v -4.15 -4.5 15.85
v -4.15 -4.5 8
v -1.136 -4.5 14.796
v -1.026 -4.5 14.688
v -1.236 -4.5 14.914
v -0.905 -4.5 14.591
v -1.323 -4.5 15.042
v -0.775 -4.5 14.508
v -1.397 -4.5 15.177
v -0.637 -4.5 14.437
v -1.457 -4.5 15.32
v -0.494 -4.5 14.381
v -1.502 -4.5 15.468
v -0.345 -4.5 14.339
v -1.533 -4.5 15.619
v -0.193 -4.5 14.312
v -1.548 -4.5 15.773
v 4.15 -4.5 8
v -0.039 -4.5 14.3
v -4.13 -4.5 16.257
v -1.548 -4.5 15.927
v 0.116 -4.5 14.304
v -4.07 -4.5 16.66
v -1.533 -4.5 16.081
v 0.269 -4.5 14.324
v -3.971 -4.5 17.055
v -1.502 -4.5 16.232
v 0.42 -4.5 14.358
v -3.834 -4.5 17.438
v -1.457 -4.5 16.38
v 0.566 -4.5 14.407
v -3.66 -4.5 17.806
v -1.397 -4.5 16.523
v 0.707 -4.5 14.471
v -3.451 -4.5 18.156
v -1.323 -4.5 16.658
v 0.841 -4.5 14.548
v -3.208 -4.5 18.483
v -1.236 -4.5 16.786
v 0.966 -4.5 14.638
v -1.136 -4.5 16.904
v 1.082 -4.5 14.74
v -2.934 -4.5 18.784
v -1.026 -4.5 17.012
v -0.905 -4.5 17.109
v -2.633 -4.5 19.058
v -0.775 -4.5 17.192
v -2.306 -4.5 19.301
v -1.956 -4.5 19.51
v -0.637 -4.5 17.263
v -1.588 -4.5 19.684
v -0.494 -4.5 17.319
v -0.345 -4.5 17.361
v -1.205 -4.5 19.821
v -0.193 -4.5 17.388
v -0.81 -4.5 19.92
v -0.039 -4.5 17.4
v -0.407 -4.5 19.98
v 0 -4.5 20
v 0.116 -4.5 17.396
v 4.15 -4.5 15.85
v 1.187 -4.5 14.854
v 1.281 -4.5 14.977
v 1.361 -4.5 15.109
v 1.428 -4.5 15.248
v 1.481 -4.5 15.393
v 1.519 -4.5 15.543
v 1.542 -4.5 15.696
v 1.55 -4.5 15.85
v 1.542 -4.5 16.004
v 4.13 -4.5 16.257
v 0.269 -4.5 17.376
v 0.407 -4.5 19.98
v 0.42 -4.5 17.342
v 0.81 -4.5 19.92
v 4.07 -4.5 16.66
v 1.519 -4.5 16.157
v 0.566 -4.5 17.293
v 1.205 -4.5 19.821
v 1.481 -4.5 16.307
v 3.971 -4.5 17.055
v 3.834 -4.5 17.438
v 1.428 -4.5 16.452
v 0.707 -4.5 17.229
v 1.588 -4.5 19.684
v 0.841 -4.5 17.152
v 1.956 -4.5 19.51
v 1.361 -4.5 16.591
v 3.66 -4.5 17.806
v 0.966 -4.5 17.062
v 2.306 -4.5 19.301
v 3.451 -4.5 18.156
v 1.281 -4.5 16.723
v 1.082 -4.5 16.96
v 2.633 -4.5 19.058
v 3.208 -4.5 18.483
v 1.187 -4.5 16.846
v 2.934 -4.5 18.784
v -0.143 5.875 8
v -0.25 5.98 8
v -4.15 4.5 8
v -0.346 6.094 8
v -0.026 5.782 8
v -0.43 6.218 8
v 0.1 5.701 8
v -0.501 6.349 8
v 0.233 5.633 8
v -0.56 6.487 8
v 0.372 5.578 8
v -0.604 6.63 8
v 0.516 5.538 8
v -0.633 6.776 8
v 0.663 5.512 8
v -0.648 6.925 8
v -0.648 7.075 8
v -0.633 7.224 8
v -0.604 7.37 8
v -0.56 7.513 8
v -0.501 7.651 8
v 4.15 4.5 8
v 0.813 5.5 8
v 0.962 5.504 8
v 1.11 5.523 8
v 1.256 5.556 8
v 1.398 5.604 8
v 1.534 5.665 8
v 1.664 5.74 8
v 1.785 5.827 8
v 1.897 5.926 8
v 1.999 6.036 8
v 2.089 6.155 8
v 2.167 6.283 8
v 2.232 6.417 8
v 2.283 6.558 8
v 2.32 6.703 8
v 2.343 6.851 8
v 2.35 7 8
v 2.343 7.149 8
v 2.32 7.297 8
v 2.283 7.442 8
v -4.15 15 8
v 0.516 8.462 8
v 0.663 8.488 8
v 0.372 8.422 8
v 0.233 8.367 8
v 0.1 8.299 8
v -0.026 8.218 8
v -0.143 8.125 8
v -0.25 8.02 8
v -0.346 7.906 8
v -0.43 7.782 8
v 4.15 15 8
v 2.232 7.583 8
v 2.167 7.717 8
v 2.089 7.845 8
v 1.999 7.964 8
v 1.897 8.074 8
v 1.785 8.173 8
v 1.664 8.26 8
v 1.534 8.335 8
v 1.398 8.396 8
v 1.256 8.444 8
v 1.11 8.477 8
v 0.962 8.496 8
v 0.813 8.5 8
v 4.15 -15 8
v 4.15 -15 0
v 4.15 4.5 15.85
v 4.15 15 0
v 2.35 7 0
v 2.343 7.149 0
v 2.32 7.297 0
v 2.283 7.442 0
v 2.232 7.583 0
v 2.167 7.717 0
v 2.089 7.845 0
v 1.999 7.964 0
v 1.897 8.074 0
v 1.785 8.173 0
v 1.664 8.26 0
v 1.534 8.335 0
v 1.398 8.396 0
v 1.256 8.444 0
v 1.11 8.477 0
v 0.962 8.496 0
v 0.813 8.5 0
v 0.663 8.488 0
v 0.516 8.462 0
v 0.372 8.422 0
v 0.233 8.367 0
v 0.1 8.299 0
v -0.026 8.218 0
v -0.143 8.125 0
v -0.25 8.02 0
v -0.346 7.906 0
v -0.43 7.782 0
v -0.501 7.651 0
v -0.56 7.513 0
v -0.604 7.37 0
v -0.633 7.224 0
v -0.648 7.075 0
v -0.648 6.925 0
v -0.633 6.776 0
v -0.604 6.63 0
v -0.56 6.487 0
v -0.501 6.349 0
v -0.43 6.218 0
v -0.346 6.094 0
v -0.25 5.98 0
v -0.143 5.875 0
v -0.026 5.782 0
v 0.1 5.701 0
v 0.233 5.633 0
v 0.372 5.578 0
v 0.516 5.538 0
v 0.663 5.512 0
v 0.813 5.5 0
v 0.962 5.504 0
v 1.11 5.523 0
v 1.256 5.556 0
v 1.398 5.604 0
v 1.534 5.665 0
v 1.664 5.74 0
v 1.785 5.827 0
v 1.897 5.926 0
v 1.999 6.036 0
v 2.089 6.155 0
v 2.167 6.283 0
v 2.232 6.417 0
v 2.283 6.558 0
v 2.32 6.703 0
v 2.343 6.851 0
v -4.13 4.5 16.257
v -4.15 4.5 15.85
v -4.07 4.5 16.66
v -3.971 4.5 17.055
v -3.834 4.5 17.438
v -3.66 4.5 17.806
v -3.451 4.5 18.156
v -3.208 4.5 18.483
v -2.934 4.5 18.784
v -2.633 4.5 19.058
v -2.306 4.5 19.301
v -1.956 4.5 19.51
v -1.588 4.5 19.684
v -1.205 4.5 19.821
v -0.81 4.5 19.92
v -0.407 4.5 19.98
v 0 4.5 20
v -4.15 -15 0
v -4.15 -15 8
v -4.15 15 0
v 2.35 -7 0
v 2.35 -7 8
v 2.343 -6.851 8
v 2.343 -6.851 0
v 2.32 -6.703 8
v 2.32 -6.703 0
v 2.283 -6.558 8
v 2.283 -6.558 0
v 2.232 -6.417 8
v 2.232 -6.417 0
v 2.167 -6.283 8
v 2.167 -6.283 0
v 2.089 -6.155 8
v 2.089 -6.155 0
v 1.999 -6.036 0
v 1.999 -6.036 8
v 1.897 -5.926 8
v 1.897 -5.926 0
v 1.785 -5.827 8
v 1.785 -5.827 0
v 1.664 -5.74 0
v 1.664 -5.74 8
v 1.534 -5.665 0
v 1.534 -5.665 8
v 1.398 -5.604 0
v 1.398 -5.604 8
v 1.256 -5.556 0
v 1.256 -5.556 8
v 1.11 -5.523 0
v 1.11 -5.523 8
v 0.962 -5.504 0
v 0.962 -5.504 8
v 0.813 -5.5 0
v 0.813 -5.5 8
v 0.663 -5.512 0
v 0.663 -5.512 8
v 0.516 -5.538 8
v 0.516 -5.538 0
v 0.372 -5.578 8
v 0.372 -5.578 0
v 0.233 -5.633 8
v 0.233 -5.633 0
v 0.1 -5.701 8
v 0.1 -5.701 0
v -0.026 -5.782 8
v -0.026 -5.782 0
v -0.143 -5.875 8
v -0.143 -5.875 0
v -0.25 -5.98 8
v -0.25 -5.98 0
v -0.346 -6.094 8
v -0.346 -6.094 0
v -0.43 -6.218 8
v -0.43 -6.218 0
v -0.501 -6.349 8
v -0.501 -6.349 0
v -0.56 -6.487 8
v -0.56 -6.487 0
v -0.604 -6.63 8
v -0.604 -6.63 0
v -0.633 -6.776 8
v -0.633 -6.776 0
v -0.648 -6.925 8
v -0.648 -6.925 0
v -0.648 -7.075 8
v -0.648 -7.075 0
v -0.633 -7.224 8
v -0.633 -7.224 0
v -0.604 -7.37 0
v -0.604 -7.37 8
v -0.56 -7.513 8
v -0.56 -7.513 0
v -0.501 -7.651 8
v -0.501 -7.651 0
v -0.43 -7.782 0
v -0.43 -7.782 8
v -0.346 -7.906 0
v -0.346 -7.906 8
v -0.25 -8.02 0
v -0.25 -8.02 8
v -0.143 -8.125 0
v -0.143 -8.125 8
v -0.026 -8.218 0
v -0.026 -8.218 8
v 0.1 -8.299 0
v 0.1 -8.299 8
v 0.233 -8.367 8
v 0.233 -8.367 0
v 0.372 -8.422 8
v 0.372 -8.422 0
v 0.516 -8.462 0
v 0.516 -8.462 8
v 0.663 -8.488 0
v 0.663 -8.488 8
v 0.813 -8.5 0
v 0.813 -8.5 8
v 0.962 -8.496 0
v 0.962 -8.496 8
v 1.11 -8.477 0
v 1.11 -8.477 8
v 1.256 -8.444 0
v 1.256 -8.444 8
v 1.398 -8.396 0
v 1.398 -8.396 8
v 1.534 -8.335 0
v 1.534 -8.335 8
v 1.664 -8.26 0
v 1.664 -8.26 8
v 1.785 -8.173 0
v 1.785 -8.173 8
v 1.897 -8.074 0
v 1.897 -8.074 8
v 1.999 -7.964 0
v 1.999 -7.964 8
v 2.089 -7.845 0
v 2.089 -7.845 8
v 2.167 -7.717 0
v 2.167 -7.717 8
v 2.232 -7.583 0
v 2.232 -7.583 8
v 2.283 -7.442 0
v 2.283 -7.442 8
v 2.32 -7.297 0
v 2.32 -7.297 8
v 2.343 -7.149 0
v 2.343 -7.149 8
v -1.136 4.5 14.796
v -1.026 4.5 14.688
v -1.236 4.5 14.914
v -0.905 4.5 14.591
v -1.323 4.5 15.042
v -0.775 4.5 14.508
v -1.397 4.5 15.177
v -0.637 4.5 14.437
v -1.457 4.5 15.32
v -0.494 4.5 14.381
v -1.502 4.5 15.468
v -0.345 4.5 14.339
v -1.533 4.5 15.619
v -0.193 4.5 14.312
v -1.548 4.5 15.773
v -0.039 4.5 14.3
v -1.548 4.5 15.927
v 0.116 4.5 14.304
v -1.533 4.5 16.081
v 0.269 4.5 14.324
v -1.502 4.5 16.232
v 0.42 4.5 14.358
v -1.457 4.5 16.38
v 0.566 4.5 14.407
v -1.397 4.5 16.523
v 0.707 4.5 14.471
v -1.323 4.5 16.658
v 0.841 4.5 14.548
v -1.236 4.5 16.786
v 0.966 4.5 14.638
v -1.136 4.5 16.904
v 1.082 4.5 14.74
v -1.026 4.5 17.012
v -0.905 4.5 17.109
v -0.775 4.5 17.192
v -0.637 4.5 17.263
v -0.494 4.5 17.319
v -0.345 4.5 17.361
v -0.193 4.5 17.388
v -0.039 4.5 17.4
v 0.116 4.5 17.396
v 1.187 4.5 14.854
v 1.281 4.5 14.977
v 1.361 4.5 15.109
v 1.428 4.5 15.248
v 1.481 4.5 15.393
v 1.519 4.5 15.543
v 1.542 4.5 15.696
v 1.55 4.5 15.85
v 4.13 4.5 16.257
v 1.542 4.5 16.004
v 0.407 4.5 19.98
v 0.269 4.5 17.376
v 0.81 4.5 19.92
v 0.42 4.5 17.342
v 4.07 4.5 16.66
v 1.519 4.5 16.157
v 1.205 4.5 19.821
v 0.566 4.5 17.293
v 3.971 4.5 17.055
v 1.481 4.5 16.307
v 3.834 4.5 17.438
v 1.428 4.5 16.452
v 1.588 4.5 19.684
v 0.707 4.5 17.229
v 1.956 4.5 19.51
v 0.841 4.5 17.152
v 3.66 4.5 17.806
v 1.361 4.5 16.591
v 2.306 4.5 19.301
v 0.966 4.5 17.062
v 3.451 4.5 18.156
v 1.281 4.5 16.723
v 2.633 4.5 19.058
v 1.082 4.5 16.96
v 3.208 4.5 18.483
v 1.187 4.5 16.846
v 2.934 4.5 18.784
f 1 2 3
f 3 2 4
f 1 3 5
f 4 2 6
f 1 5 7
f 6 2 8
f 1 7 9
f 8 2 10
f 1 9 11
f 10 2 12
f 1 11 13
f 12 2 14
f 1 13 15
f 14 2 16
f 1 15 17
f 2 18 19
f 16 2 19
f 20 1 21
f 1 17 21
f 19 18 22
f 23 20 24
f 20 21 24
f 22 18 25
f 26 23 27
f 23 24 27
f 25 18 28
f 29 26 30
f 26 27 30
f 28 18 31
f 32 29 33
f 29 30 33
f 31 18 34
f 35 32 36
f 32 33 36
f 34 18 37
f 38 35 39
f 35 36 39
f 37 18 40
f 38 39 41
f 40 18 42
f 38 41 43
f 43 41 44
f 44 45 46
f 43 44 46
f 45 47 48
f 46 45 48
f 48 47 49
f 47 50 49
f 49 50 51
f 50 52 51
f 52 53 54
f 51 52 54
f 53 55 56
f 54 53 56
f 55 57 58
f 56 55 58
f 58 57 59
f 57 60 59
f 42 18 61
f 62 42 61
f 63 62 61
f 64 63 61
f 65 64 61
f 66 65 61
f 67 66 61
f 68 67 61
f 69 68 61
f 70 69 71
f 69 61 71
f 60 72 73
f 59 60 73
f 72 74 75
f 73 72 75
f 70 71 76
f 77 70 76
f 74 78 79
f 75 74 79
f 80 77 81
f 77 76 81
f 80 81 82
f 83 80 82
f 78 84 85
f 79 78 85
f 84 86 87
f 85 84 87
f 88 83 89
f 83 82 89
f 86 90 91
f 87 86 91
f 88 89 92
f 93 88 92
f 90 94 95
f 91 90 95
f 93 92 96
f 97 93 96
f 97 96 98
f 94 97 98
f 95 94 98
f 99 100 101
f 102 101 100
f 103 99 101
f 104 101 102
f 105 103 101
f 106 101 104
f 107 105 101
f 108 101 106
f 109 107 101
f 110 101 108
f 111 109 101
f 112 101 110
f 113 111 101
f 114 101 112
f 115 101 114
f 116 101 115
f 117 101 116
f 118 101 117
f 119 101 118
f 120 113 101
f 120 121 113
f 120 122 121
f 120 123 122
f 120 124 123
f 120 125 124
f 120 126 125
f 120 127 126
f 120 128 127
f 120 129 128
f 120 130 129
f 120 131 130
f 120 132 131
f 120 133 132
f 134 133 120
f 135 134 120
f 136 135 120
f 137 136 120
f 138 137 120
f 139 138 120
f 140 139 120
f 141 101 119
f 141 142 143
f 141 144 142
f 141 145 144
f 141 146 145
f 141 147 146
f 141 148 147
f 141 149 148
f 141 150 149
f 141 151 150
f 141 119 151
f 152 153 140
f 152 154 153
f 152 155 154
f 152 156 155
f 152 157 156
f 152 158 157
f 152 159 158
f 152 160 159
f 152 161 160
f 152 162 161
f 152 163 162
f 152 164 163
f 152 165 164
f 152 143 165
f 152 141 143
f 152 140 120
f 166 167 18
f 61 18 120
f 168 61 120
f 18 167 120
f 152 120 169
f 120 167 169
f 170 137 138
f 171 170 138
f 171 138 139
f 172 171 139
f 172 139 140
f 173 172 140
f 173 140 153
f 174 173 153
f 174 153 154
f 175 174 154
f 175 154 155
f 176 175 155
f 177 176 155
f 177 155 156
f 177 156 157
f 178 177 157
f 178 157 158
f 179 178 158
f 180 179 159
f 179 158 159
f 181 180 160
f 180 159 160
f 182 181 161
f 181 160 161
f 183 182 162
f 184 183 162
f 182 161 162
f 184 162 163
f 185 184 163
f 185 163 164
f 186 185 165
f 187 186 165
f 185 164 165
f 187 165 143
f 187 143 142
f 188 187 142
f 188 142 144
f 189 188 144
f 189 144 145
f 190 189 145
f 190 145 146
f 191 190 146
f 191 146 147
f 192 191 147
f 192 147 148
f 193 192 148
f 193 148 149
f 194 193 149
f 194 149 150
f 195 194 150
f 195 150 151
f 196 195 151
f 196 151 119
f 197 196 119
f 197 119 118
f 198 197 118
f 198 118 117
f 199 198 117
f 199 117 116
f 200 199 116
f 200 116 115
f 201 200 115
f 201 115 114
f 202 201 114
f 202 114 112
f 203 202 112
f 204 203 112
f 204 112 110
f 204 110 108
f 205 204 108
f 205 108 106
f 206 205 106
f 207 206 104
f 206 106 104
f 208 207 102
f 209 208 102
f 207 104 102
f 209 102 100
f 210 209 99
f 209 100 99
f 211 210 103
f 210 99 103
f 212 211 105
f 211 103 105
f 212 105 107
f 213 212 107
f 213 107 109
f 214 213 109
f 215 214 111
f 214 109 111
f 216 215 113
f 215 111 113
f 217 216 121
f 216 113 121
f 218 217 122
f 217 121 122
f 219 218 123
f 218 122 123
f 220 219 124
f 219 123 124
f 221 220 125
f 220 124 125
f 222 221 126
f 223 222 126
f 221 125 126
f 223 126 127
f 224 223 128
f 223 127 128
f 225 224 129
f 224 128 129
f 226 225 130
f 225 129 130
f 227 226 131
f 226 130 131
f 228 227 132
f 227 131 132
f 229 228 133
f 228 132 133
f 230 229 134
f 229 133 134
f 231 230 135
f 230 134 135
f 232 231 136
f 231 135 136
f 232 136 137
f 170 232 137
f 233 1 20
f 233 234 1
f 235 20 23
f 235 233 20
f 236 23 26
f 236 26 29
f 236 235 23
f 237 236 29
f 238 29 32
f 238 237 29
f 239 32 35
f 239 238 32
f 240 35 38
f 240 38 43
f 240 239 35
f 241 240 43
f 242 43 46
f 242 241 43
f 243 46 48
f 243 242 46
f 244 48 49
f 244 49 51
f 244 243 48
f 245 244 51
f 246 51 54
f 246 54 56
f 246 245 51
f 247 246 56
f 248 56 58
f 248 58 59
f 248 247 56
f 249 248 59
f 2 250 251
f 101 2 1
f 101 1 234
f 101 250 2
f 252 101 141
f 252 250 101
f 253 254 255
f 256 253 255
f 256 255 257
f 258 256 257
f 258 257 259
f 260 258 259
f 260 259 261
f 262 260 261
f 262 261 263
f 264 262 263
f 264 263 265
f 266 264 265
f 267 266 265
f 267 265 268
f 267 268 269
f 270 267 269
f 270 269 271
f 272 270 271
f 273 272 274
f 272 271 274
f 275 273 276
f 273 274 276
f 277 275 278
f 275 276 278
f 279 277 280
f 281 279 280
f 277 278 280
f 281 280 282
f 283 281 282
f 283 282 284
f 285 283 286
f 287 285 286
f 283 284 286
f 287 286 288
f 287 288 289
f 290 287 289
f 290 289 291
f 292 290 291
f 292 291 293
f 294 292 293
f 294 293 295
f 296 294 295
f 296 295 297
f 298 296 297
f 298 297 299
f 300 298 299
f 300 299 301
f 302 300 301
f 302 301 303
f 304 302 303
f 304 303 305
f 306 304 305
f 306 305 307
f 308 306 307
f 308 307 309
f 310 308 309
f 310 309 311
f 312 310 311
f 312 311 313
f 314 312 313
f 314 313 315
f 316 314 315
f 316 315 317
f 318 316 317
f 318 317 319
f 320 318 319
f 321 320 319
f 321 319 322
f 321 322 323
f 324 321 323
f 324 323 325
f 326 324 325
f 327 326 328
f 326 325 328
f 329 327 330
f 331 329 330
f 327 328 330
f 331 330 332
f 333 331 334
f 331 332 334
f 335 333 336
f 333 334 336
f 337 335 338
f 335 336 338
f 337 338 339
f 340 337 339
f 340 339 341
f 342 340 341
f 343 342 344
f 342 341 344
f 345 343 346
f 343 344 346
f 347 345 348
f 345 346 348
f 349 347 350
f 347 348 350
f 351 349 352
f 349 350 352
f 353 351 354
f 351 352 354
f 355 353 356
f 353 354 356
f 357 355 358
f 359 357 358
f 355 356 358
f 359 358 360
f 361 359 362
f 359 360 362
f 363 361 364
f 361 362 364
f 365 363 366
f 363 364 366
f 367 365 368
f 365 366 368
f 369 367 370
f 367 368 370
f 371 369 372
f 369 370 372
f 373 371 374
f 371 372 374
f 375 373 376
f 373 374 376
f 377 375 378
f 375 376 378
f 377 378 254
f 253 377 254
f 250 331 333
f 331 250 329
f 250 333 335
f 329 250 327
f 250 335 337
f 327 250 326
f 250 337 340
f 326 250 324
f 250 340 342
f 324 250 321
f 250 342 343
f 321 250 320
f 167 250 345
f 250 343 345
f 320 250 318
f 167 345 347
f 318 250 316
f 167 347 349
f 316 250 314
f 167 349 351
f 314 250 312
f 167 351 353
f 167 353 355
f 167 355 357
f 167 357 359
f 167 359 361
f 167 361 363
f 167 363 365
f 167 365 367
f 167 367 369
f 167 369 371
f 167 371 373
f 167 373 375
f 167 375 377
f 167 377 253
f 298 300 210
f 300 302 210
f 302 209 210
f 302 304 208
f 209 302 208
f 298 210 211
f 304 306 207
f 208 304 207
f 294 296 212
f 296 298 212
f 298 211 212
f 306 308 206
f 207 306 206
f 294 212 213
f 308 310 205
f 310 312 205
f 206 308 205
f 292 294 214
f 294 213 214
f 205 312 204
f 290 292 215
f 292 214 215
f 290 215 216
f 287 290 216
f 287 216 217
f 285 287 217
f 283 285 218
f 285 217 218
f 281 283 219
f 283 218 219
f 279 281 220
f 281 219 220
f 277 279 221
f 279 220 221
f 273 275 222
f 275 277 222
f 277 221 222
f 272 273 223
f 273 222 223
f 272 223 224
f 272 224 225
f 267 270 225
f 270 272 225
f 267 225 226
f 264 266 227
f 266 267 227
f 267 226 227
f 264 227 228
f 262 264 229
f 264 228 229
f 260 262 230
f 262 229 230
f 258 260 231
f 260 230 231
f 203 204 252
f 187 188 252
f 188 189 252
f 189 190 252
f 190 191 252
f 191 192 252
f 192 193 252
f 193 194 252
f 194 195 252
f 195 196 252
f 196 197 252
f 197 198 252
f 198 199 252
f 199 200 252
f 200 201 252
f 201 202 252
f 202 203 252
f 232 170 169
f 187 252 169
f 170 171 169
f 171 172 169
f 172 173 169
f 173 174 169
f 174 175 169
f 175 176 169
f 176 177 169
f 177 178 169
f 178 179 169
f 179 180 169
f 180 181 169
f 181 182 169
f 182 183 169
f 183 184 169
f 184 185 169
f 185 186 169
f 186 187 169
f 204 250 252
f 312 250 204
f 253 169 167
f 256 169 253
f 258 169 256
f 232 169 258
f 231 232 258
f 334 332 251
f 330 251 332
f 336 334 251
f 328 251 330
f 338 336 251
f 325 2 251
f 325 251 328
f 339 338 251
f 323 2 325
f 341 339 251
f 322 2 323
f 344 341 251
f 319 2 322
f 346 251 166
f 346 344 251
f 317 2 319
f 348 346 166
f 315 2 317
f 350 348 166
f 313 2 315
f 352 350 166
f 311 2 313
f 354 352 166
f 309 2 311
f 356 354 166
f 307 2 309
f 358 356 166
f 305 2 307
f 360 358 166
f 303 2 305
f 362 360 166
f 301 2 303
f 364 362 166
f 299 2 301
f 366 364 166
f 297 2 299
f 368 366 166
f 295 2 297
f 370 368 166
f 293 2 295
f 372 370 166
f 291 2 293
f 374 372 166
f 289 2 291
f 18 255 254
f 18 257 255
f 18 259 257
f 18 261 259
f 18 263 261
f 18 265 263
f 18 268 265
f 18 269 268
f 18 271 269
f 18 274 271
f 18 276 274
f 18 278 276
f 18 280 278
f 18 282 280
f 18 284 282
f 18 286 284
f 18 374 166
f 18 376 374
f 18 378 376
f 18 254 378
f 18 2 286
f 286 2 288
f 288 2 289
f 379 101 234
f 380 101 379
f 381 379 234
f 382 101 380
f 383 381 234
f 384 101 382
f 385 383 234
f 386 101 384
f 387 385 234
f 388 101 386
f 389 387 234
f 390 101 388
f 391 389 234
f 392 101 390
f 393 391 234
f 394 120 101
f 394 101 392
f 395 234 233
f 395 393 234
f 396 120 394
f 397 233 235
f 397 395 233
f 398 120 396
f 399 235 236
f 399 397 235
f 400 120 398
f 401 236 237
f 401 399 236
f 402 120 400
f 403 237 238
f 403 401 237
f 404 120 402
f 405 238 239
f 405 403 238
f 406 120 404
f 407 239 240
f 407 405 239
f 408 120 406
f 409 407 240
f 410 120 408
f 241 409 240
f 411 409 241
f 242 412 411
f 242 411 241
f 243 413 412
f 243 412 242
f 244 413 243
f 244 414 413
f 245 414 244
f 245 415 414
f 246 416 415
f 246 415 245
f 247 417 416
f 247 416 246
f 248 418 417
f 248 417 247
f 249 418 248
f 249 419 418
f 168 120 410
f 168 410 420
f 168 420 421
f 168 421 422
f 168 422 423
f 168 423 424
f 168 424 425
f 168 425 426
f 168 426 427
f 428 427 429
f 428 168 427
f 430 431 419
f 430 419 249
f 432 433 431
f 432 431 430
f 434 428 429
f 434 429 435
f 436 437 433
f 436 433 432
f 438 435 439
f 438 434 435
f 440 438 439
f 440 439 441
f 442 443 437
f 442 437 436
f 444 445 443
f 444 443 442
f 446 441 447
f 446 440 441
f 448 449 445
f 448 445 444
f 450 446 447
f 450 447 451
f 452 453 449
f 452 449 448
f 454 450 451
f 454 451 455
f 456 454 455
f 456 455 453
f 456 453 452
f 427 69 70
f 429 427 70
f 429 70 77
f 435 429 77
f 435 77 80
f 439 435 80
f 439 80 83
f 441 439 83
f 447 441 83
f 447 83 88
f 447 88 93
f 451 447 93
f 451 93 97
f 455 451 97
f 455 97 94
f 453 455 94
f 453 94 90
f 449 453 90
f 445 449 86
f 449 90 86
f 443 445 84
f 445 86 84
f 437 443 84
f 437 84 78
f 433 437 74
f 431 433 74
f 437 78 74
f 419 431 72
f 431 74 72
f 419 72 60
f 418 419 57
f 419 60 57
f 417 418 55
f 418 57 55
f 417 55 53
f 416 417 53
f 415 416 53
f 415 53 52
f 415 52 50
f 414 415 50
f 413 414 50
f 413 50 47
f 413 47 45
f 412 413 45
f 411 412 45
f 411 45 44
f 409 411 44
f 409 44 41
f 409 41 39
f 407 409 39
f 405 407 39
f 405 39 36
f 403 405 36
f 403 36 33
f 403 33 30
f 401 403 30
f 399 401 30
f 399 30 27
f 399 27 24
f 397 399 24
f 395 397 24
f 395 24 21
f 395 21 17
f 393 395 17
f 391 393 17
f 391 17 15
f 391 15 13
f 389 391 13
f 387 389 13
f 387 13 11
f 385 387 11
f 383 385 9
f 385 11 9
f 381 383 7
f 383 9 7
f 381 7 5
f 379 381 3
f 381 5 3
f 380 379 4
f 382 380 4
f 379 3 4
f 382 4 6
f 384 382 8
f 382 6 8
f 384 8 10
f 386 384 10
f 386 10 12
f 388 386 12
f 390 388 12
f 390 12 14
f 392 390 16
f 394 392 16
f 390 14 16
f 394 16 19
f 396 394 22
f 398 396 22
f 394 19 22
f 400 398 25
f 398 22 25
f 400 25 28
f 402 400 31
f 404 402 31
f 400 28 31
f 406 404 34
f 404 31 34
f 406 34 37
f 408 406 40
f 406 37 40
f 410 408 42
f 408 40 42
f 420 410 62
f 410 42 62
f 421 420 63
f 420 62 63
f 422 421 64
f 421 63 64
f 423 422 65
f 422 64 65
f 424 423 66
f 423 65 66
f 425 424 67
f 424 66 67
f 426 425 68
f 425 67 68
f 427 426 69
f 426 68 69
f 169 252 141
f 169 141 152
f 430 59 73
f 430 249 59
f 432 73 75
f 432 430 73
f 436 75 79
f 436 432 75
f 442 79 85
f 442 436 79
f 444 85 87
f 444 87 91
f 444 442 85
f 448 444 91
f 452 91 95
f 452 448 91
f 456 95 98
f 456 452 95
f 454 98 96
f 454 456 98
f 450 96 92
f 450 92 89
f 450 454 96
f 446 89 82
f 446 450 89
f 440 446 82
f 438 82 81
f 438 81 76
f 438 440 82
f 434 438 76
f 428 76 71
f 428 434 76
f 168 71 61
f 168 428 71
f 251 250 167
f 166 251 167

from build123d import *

# Parameters (mm, degrees)
F0_W     = 8.3
F0_H     = 30
F1_DEPTH = 8
F2_R     = 1.5
F3_DEPTH = 8.001
F4_W     = 9
F4_H     = 12
F5_DEPTH = 8.3
F6_R     = 1.55
F7_DEPTH = 19.501
F8_R     = 4.14999


# Not quite as in the source:
# - a fillet or chamfer is up to 0.001 mm smaller than in the source, because OpenCascade refuses the exact size


with BuildPart() as f1:
    # F0 (on Top) → F1 (new body)
    with BuildSketch(Plane.XY):
        Rectangle(F0_W, F0_H)
    extrude(amount=F1_DEPTH)

    # F2 (on face) → F3 (cut, through all)
    with BuildSketch(Plane.XY.offset(8)):
        with Locations((0.85, -7)):
            Circle(F2_R)
        with Locations((0.85, 7)):
            Circle(F2_R)
    extrude(amount=-F3_DEPTH, mode=Mode.SUBTRACT)

    # F4 (on face) → F5 (join, through all)
    with BuildSketch(Plane.YZ.offset(4.15)):
        with Locations((0, 14)):
            Rectangle(F4_W, F4_H)
    extrude(amount=-F5_DEPTH)

    # F6 (on face) → F7 (cut, through all)
    with BuildSketch(Plane.XZ.offset(4.5)):
        with Locations((0, 15.85)):
            Circle(F6_R)
    extrude(amount=-F7_DEPTH, mode=Mode.SUBTRACT)

    # F8 (radius 4.15 in the source; OpenCascade refuses exactly that, so slightly less here)
    f8_edges = [f1.edges().sort_by_distance(p)[0] for p in [
        (4.15, 0, 20),
        (-4.15, 0, 20),
    ]]
    fillet(f8_edges, radius=F8_R)


solid = f1.part
